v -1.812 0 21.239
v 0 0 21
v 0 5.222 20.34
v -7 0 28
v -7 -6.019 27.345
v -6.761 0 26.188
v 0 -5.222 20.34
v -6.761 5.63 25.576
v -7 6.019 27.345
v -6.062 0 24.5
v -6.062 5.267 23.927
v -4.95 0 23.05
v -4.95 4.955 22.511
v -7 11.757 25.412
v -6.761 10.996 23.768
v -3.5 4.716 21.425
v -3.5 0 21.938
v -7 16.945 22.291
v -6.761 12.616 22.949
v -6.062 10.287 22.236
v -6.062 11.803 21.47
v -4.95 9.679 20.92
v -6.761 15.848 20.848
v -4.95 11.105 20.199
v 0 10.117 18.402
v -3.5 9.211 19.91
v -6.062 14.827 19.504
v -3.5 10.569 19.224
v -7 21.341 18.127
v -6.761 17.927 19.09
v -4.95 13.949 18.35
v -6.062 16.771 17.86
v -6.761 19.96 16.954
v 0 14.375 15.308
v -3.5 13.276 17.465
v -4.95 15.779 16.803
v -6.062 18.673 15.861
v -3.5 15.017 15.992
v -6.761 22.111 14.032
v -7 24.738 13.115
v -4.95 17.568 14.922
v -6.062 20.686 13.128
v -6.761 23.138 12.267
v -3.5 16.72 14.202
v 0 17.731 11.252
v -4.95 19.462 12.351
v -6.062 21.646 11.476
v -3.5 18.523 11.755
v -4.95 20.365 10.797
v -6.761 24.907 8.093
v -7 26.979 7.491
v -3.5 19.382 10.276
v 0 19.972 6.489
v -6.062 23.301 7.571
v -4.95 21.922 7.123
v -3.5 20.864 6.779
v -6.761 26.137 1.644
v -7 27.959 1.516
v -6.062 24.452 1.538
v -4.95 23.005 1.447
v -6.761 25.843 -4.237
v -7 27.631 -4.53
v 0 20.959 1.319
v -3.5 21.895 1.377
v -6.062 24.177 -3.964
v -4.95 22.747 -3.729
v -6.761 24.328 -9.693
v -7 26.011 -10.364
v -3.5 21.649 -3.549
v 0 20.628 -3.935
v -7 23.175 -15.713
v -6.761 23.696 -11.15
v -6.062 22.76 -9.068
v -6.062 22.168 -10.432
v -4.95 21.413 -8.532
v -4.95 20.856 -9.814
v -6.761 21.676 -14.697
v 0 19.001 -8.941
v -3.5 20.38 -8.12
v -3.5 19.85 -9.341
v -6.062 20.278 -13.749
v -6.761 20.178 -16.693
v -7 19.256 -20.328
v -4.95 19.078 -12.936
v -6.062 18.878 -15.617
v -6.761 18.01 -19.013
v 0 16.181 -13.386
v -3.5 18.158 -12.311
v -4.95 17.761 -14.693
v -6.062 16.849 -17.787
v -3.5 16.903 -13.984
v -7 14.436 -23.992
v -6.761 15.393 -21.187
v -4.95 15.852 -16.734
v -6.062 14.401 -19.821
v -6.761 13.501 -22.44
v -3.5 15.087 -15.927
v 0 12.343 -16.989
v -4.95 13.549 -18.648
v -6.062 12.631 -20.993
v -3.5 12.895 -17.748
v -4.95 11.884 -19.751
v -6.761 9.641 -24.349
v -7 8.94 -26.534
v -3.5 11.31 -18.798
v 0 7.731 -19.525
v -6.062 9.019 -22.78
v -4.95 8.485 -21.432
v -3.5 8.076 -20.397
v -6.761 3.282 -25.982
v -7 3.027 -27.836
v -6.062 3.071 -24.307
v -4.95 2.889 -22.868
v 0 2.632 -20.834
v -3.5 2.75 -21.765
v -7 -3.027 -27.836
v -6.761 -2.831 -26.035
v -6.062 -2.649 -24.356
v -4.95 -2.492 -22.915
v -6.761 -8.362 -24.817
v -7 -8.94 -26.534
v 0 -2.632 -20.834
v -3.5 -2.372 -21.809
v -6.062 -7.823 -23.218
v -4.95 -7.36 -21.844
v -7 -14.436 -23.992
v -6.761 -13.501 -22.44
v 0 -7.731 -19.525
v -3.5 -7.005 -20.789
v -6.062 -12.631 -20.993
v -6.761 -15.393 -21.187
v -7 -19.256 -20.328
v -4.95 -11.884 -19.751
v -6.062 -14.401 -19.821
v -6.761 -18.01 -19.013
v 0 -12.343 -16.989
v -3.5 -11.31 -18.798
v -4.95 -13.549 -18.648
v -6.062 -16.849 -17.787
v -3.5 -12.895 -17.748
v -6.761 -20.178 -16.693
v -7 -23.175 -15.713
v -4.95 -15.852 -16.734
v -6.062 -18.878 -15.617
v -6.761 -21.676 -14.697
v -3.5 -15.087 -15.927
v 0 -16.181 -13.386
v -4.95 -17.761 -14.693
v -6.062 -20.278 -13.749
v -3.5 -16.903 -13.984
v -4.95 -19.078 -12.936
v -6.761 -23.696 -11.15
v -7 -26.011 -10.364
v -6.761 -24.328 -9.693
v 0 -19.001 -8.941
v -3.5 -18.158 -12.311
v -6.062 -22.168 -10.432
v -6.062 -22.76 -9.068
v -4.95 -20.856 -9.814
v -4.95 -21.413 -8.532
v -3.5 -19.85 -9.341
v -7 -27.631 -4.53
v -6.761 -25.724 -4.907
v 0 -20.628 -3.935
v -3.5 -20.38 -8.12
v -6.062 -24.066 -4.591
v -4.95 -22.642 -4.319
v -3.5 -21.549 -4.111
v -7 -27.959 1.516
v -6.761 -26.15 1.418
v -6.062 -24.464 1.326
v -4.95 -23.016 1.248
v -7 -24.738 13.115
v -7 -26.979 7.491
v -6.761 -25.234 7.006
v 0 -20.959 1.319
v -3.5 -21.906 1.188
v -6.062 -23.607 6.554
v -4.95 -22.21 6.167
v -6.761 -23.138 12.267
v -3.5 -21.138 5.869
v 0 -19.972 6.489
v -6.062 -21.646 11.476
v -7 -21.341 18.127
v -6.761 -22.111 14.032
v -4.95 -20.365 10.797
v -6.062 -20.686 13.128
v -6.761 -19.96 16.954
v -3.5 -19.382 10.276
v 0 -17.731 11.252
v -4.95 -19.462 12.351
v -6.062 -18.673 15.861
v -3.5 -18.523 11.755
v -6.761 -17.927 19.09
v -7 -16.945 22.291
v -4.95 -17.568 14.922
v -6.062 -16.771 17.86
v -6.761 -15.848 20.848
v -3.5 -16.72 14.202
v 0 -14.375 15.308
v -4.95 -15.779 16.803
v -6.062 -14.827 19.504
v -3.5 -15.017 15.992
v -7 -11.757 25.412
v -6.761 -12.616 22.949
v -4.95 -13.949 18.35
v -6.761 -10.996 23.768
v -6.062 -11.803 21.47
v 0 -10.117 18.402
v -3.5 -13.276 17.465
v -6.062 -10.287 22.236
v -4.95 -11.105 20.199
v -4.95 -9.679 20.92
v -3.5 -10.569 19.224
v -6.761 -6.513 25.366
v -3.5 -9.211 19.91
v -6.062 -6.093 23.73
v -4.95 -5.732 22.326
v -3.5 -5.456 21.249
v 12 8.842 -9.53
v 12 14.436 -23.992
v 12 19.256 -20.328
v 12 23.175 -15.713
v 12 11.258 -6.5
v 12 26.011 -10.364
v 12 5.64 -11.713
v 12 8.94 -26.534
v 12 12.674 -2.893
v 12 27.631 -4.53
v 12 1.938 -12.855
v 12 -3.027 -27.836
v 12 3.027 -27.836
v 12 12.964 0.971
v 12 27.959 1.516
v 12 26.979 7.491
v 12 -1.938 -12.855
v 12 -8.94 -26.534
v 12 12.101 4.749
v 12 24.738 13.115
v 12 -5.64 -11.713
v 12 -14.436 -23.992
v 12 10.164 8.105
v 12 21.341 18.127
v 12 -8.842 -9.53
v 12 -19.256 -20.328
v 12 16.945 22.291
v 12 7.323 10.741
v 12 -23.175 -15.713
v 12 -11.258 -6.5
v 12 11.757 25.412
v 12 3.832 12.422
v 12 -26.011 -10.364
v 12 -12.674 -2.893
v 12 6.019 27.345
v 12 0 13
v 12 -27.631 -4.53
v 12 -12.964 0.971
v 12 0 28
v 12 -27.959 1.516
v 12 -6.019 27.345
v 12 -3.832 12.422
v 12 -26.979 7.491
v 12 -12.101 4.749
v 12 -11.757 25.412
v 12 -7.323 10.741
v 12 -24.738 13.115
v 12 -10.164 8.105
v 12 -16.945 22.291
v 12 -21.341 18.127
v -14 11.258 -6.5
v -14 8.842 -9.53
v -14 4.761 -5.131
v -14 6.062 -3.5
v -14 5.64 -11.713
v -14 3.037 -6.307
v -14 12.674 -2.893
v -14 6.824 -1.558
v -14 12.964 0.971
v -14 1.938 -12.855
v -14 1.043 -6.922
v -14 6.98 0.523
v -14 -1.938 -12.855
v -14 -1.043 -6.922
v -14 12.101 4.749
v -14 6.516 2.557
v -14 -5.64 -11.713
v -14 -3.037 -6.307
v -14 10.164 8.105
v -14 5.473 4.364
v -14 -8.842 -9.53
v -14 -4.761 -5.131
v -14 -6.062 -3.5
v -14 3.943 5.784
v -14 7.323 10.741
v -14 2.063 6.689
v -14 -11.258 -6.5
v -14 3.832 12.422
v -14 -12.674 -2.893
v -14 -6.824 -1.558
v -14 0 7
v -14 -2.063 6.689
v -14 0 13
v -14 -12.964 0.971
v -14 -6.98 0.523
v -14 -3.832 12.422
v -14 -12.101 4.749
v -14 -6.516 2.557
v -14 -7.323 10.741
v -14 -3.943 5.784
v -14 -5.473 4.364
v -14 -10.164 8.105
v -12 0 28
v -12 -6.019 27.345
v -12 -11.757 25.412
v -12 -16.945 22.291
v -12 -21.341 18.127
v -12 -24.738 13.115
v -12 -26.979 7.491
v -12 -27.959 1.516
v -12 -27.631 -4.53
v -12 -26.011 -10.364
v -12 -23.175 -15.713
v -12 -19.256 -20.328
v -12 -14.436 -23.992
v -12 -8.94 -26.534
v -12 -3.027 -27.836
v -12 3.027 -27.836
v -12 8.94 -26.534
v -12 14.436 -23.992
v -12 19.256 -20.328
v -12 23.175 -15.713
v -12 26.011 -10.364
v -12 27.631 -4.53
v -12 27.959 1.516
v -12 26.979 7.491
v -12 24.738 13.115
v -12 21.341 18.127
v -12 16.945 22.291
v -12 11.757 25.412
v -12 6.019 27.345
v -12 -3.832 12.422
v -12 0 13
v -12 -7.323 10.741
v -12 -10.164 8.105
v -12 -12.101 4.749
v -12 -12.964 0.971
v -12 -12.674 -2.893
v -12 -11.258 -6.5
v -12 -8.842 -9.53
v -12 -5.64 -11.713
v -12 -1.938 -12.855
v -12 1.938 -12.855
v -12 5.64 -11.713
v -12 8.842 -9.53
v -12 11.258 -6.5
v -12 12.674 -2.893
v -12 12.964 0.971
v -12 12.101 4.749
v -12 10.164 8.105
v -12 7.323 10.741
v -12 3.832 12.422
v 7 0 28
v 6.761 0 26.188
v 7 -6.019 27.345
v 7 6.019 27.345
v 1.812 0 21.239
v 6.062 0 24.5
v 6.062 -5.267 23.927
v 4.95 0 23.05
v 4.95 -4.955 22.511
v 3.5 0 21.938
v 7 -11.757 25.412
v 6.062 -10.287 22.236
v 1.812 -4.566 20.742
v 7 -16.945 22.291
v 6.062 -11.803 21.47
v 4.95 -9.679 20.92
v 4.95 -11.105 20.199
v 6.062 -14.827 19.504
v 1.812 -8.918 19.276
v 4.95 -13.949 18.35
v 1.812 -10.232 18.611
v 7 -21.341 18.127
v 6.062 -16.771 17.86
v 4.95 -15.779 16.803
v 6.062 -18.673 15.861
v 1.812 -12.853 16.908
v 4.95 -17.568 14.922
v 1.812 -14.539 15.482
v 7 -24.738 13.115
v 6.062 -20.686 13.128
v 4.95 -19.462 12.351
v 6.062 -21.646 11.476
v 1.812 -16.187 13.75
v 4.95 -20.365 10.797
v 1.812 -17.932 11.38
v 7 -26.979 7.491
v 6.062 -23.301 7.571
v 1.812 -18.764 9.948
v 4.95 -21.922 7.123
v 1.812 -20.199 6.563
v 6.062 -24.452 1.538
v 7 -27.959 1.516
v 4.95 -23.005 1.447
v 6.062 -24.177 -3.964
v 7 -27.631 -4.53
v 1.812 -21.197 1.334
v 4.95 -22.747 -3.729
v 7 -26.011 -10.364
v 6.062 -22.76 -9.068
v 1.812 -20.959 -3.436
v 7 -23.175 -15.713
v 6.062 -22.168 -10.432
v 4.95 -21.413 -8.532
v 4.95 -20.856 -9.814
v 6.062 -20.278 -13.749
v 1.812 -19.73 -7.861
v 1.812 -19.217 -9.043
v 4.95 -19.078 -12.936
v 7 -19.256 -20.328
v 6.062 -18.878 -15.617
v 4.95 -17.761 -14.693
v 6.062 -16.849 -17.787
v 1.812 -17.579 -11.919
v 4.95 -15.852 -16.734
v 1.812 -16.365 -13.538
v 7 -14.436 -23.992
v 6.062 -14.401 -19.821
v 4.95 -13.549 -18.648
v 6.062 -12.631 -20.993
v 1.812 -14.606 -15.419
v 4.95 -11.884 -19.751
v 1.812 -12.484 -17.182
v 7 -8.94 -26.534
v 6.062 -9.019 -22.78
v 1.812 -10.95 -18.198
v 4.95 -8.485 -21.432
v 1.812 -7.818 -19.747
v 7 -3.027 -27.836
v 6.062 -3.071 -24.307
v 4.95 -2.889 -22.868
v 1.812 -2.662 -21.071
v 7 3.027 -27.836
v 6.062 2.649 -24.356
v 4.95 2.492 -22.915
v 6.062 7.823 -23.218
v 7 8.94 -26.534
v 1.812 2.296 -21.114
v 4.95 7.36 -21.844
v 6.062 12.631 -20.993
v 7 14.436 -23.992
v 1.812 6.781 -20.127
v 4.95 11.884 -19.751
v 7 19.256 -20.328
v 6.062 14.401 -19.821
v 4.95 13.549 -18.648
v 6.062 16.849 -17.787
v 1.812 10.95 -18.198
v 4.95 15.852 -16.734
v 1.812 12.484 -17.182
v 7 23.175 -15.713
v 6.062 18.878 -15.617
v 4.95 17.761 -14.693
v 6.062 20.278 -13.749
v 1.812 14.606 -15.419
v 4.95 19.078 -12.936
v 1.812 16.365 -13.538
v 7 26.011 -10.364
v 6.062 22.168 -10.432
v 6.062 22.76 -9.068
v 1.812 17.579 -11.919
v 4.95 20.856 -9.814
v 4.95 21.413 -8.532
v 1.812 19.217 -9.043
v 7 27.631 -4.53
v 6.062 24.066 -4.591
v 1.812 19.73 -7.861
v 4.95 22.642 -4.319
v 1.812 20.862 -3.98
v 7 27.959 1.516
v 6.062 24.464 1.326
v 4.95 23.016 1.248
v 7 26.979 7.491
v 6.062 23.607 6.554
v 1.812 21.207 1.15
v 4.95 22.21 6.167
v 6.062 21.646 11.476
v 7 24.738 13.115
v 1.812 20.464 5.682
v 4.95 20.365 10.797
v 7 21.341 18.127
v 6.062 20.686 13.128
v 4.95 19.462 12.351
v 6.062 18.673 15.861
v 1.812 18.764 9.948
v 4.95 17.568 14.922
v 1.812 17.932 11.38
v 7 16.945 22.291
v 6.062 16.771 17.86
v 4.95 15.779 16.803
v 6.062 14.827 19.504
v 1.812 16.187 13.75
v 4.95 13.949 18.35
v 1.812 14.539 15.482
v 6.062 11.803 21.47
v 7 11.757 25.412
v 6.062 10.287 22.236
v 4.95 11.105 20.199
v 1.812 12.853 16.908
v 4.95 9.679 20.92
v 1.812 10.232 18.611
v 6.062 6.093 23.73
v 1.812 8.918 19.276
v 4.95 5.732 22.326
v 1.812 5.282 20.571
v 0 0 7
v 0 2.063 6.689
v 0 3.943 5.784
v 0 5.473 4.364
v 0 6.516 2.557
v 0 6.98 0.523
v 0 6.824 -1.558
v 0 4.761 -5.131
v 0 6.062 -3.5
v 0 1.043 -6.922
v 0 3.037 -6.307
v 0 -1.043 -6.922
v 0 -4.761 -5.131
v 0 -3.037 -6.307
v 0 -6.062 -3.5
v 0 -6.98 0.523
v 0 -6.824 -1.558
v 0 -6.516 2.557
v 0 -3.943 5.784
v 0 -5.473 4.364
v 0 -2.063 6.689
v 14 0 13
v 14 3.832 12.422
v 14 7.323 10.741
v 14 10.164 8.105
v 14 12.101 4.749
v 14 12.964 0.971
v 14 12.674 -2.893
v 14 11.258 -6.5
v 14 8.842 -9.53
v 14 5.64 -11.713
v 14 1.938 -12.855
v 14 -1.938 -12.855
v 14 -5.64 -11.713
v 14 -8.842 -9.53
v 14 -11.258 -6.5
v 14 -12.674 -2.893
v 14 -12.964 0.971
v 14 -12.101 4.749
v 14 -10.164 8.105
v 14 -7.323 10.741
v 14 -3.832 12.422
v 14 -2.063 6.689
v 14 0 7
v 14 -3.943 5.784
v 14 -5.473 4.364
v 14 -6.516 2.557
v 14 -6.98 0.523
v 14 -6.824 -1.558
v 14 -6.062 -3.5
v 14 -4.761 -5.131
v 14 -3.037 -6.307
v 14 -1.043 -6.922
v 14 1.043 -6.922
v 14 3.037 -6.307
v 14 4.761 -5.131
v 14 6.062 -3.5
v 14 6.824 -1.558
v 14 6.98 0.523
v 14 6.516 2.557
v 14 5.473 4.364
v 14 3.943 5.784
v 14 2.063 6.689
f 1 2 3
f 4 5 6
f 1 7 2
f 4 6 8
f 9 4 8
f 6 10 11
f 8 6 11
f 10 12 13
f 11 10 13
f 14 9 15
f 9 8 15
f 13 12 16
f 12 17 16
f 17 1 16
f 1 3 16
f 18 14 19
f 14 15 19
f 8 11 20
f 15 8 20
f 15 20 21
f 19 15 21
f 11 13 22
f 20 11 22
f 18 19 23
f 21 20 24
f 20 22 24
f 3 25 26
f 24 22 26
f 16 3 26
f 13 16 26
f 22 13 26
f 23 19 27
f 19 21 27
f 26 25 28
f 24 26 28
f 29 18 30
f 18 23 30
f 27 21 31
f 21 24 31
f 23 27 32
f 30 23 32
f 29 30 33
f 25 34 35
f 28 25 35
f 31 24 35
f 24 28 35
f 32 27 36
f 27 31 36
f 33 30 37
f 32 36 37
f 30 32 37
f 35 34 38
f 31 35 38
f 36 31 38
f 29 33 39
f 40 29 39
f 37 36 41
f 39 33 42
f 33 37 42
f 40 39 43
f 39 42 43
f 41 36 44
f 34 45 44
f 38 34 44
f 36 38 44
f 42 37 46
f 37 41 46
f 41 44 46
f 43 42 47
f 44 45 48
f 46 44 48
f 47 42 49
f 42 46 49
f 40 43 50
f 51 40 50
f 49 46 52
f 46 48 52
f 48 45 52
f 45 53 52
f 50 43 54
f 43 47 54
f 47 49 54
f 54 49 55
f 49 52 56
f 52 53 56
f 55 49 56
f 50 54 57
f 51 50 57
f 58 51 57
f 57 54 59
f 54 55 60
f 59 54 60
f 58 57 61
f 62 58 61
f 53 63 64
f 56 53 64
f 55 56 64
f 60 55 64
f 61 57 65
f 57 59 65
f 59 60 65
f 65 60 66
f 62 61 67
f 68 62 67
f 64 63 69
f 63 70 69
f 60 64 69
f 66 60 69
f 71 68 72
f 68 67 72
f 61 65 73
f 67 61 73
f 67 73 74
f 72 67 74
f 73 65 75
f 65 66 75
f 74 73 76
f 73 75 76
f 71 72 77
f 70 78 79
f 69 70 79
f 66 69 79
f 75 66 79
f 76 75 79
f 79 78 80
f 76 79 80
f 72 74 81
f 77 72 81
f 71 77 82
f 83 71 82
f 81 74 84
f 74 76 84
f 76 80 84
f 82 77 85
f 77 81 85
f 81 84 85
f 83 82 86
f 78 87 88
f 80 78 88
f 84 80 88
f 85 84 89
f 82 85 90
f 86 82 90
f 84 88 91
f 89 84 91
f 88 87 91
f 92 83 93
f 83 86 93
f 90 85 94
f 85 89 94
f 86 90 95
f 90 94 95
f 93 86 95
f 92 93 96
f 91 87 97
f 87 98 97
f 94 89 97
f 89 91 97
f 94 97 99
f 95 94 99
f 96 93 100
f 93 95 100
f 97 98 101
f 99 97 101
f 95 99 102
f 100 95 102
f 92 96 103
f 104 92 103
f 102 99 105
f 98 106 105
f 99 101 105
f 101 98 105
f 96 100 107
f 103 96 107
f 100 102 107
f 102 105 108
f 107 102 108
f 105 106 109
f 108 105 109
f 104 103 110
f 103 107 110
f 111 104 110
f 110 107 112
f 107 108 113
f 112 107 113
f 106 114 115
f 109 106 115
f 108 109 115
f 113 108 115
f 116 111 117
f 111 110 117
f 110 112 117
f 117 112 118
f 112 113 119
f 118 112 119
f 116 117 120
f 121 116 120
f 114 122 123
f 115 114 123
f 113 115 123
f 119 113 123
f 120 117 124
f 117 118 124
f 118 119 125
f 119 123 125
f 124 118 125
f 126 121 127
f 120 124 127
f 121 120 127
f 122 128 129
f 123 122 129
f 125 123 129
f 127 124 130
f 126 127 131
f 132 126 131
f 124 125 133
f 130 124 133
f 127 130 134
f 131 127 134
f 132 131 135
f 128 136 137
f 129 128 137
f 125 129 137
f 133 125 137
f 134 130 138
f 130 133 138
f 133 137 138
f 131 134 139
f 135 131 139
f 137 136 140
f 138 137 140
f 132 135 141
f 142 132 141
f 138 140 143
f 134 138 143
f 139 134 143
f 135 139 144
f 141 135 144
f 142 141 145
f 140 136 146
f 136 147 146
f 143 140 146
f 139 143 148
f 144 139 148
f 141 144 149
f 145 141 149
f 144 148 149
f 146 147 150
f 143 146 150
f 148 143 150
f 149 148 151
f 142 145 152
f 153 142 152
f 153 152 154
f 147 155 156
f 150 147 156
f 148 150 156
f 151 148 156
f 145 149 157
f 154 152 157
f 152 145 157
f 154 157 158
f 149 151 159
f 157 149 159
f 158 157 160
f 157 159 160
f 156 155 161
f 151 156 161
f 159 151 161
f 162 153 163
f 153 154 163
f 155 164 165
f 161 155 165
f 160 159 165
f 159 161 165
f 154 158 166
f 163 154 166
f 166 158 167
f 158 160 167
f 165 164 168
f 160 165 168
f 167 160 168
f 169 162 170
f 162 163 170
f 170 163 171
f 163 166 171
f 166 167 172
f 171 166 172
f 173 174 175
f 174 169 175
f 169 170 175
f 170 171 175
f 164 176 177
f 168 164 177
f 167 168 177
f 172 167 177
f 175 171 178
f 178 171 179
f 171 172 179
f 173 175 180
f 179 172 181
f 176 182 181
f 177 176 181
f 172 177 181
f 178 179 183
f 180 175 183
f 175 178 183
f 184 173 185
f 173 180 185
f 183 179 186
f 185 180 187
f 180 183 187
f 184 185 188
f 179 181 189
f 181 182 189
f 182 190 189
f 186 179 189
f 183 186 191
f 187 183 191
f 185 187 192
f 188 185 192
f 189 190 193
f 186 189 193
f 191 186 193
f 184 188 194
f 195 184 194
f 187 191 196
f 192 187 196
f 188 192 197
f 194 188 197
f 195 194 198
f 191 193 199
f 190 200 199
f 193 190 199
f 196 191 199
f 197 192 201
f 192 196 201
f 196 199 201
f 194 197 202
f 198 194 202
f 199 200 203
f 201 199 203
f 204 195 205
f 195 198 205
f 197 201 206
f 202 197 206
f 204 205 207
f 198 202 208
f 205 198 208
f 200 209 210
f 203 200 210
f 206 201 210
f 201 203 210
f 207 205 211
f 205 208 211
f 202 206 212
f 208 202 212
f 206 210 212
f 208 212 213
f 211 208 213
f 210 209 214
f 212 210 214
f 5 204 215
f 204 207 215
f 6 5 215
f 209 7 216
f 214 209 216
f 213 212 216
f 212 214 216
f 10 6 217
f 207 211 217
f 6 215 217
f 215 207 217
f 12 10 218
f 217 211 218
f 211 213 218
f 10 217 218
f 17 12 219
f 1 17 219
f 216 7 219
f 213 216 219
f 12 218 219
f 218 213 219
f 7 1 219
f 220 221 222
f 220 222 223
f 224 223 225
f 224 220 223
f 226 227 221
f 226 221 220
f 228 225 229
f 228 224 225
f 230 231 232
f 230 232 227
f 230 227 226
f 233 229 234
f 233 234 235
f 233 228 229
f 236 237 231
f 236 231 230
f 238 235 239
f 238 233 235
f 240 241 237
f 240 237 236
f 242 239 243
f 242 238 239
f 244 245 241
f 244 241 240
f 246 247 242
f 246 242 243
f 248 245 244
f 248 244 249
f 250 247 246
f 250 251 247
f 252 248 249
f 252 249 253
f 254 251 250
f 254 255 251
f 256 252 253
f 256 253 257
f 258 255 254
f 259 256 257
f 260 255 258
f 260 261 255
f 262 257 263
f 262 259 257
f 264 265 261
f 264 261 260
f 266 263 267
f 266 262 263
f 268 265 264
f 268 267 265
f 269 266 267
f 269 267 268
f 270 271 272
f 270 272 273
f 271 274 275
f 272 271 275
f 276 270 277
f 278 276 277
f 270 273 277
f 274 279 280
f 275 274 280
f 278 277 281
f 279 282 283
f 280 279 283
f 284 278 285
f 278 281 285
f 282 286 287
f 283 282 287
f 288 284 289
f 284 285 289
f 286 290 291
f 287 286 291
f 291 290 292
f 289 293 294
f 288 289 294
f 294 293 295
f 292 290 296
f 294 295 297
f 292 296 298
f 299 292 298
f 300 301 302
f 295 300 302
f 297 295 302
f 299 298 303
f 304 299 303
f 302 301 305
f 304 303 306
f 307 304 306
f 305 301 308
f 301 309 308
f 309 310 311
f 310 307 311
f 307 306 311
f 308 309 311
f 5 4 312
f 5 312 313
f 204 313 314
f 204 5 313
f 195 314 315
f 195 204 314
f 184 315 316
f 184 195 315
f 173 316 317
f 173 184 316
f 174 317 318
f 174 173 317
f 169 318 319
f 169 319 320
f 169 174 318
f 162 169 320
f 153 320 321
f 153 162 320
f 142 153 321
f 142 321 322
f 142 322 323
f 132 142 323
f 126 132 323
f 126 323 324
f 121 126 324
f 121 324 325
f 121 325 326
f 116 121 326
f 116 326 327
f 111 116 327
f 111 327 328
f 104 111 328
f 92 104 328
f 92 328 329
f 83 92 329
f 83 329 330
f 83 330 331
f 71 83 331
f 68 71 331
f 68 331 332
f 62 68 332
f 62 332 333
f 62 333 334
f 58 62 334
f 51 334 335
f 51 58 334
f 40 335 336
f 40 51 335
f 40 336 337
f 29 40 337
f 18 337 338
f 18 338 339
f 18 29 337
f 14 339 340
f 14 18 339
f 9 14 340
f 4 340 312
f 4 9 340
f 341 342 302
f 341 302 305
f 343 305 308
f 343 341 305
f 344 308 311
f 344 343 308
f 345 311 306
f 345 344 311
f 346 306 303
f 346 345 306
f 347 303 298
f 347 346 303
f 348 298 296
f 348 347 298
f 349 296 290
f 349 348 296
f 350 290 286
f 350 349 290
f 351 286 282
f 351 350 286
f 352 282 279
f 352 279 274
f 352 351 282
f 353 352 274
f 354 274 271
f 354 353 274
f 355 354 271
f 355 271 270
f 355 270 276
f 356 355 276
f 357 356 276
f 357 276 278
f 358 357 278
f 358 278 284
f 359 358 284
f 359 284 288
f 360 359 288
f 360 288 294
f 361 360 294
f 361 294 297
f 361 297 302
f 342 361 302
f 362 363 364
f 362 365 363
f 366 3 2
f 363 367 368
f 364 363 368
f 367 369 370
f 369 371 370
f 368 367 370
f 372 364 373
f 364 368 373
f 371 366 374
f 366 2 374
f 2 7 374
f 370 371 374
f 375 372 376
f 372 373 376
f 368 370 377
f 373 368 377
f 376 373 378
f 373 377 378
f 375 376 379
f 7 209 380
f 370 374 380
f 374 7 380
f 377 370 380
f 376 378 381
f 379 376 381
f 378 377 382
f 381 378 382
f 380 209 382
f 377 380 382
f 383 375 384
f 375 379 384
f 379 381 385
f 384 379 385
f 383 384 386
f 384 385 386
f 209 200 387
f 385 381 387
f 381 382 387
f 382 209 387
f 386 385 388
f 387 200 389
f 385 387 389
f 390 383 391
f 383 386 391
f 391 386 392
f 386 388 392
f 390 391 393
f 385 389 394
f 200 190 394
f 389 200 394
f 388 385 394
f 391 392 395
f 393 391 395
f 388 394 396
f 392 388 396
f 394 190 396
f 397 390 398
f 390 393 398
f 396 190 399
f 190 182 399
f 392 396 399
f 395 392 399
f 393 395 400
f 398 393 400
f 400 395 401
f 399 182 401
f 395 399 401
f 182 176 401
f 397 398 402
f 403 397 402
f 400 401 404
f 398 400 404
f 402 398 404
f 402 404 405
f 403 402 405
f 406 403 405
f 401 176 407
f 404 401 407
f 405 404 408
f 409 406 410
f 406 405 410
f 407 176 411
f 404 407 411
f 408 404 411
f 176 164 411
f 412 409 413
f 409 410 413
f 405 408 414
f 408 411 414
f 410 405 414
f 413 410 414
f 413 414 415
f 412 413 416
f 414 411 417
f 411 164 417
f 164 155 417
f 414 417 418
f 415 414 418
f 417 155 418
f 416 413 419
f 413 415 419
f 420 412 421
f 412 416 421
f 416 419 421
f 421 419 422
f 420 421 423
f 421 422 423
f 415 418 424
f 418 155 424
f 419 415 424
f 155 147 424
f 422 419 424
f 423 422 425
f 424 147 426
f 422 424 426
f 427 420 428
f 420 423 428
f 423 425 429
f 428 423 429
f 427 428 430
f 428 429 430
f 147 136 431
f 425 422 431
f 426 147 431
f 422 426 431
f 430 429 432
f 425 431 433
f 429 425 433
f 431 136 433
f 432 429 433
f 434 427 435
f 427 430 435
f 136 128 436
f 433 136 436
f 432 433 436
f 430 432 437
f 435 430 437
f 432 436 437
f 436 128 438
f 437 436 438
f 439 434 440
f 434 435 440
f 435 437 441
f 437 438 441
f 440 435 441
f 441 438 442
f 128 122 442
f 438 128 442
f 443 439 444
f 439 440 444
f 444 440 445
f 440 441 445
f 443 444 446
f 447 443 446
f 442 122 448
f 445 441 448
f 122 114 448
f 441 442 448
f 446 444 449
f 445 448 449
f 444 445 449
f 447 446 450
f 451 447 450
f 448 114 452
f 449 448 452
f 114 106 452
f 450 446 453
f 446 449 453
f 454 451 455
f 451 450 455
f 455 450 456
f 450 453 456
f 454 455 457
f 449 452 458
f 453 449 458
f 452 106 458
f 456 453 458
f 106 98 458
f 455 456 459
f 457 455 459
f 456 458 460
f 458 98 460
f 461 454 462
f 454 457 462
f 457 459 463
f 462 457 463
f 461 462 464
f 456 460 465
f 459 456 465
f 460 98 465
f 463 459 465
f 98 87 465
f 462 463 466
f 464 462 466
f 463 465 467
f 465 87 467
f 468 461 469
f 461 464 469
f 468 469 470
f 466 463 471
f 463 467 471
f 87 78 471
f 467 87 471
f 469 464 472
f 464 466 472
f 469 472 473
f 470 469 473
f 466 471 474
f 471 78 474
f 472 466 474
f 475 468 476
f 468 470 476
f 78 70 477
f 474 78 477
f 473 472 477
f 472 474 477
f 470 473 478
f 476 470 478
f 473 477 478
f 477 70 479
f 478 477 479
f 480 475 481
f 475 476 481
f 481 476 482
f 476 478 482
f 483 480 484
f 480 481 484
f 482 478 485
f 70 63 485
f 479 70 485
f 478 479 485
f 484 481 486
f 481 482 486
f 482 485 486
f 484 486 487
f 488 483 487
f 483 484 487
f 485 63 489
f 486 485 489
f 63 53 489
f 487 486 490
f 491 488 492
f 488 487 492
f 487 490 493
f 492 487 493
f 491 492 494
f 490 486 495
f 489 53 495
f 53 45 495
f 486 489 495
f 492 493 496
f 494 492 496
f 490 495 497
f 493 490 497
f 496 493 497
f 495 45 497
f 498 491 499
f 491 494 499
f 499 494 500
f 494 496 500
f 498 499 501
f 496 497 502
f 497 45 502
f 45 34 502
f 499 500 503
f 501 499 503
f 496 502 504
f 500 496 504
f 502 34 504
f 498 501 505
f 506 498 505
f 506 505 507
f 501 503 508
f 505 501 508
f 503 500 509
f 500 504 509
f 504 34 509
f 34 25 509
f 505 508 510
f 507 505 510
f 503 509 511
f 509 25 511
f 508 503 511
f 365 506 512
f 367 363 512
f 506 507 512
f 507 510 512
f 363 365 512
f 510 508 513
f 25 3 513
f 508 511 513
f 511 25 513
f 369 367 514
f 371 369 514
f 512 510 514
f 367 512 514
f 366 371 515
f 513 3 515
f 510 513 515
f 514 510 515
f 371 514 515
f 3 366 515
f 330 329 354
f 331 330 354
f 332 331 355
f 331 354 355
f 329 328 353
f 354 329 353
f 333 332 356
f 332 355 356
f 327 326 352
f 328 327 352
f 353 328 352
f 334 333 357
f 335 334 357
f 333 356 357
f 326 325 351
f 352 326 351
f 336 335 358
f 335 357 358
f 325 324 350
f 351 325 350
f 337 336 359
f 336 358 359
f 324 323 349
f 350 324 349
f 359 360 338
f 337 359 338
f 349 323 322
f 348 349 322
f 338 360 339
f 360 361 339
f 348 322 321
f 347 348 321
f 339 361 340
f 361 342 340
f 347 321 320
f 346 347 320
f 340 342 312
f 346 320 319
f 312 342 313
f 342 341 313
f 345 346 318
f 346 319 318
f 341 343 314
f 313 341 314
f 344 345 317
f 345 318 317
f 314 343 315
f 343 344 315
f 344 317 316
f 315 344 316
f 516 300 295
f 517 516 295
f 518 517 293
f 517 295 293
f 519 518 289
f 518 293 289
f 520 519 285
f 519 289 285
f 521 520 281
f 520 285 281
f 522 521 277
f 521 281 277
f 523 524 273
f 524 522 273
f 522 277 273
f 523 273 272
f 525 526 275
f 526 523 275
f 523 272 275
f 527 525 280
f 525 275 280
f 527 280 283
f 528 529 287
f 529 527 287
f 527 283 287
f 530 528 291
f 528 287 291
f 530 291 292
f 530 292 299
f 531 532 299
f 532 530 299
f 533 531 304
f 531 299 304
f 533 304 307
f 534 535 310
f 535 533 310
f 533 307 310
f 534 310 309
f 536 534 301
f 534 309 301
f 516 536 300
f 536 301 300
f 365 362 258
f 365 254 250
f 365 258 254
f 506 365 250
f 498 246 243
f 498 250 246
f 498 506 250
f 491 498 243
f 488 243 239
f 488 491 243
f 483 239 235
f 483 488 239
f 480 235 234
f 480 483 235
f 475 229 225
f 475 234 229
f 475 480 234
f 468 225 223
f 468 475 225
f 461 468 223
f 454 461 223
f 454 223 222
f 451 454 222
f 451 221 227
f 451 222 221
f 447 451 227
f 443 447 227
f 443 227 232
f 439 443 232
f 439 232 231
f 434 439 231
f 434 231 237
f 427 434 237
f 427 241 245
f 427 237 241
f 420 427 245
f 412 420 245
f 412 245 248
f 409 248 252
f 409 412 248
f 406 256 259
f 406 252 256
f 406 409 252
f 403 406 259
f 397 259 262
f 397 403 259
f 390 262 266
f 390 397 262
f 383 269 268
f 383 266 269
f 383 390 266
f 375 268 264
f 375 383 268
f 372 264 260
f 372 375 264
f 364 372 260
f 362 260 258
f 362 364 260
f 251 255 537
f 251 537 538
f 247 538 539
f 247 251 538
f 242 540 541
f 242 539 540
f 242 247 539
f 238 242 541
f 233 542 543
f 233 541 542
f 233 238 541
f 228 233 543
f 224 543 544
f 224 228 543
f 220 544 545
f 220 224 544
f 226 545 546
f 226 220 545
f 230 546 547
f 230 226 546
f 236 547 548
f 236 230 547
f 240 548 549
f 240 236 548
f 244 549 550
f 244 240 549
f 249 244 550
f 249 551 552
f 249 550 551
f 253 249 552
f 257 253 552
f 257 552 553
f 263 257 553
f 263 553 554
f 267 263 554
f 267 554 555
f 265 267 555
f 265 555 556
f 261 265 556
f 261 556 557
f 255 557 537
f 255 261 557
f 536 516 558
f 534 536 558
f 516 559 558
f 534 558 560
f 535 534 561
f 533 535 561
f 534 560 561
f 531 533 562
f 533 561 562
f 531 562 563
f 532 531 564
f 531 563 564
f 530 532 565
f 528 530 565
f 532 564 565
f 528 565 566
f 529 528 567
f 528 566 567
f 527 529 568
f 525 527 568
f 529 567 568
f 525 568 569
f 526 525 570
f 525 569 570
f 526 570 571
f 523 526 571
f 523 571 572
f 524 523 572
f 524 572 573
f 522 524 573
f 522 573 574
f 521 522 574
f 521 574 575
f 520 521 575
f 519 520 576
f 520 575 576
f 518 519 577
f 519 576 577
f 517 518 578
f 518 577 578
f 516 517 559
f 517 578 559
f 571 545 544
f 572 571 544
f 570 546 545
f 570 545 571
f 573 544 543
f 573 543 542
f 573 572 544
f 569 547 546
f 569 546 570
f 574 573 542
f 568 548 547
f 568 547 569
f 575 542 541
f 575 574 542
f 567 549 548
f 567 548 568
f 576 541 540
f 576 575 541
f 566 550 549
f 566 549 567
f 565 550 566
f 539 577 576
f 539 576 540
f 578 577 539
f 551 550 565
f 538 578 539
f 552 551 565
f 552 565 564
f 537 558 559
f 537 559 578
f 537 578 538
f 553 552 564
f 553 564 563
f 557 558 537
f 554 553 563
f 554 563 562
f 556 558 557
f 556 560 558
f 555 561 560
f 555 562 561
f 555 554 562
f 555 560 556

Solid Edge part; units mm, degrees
sketch "Sketch1" plane through (0, 0, 0) normal (0, -1, 0) x (1, 0, 0)
  line L0 (-12, 28) -> (-7, 28)
  arc A0 (-7, 28) -> (0, 21) centre (0, 28) ccw
  arc A1 (7, 28) -> (0, 21) centre (0, 28) cw
  line L1 (12, 28) -> (7, 28)
  line L2 (12, 13) -> (12, 28)
  line L3 (14, 13) -> (12, 13)
  line L4 (14, 7) -> (14, 13)
  line L5 (0, 7) -> (14, 7)
  line L6 (0, 7) -> (-14, 7)
  line L7 (-14, 7) -> (-14, 13)
  line L8 (-14, 13) -> (-12, 13)
  line L9 (-12, 13) -> (-12, 28)
revolve "RevolvedProtrusion1" add sketch "Sketch1" angle 360 about axis through (0, 0, 0) along (1, 0, 0)
